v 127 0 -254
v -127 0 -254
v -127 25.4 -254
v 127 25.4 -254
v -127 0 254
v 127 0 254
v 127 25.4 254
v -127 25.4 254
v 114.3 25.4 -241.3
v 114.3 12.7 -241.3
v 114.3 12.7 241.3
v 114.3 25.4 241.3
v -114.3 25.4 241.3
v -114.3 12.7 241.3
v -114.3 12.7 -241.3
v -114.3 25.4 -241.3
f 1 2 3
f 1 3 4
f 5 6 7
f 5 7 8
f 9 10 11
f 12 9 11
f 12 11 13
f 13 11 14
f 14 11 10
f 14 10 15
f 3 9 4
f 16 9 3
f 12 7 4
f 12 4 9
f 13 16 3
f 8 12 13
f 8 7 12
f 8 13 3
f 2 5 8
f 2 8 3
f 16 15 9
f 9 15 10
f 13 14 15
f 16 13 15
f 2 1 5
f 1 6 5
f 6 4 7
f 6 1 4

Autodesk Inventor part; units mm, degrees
ref_plane "YZ Plane" through (0, 0, 0) normal (1, 0, 0) x (0, 1, 0)
ref_plane "XZ Plane" through (0, 0, 0) normal (0, 1, 0) x (-1, 0, 0)
ref_plane "XY Plane" through (0, 0, 0) normal (0, 0, 1) x (1, 0, 0)
sketch "Sketch1" plane through (0, 0, 0) normal (0, 1, 0) x (-1, 0, 0)
  line L0 (-127, 254) -> (127, 254)
  line L1 (127, 254) -> (127, -254)
  line L2 (127, -254) -> (-127, -254)
  line L3 (-127, -254) -> (-127, 254)
  line L4 (-127, 254) -> (127, -254) construction
  line L5 (127, 254) -> (-127, -254) construction
  line L6 (-114.3, 241.3) -> (114.3, 241.3)
  line L7 (114.3, 241.3) -> (114.3, -241.3)
  line L8 (114.3, -241.3) -> (-114.3, -241.3)
  line L9 (-114.3, -241.3) -> (-114.3, 241.3)
  line L10 (-114.3, 241.3) -> (114.3, -241.3) construction
  line L11 (114.3, 241.3) -> (-114.3, -241.3) construction
  point P0 (0, 0)
  dimension "d0" = 508
  dimension "d1" = 254
  dimension "d2" = 482.6
  dimension "d3" = 228.6
extrude "Extrusion1" add sketch "Sketch1" along normal blind 12.7 contours L6 L7 L8 L9
extrude "Extrusion2" add sketch "Sketch1" along normal blind 25.4
properties part number "Potting Tray"
